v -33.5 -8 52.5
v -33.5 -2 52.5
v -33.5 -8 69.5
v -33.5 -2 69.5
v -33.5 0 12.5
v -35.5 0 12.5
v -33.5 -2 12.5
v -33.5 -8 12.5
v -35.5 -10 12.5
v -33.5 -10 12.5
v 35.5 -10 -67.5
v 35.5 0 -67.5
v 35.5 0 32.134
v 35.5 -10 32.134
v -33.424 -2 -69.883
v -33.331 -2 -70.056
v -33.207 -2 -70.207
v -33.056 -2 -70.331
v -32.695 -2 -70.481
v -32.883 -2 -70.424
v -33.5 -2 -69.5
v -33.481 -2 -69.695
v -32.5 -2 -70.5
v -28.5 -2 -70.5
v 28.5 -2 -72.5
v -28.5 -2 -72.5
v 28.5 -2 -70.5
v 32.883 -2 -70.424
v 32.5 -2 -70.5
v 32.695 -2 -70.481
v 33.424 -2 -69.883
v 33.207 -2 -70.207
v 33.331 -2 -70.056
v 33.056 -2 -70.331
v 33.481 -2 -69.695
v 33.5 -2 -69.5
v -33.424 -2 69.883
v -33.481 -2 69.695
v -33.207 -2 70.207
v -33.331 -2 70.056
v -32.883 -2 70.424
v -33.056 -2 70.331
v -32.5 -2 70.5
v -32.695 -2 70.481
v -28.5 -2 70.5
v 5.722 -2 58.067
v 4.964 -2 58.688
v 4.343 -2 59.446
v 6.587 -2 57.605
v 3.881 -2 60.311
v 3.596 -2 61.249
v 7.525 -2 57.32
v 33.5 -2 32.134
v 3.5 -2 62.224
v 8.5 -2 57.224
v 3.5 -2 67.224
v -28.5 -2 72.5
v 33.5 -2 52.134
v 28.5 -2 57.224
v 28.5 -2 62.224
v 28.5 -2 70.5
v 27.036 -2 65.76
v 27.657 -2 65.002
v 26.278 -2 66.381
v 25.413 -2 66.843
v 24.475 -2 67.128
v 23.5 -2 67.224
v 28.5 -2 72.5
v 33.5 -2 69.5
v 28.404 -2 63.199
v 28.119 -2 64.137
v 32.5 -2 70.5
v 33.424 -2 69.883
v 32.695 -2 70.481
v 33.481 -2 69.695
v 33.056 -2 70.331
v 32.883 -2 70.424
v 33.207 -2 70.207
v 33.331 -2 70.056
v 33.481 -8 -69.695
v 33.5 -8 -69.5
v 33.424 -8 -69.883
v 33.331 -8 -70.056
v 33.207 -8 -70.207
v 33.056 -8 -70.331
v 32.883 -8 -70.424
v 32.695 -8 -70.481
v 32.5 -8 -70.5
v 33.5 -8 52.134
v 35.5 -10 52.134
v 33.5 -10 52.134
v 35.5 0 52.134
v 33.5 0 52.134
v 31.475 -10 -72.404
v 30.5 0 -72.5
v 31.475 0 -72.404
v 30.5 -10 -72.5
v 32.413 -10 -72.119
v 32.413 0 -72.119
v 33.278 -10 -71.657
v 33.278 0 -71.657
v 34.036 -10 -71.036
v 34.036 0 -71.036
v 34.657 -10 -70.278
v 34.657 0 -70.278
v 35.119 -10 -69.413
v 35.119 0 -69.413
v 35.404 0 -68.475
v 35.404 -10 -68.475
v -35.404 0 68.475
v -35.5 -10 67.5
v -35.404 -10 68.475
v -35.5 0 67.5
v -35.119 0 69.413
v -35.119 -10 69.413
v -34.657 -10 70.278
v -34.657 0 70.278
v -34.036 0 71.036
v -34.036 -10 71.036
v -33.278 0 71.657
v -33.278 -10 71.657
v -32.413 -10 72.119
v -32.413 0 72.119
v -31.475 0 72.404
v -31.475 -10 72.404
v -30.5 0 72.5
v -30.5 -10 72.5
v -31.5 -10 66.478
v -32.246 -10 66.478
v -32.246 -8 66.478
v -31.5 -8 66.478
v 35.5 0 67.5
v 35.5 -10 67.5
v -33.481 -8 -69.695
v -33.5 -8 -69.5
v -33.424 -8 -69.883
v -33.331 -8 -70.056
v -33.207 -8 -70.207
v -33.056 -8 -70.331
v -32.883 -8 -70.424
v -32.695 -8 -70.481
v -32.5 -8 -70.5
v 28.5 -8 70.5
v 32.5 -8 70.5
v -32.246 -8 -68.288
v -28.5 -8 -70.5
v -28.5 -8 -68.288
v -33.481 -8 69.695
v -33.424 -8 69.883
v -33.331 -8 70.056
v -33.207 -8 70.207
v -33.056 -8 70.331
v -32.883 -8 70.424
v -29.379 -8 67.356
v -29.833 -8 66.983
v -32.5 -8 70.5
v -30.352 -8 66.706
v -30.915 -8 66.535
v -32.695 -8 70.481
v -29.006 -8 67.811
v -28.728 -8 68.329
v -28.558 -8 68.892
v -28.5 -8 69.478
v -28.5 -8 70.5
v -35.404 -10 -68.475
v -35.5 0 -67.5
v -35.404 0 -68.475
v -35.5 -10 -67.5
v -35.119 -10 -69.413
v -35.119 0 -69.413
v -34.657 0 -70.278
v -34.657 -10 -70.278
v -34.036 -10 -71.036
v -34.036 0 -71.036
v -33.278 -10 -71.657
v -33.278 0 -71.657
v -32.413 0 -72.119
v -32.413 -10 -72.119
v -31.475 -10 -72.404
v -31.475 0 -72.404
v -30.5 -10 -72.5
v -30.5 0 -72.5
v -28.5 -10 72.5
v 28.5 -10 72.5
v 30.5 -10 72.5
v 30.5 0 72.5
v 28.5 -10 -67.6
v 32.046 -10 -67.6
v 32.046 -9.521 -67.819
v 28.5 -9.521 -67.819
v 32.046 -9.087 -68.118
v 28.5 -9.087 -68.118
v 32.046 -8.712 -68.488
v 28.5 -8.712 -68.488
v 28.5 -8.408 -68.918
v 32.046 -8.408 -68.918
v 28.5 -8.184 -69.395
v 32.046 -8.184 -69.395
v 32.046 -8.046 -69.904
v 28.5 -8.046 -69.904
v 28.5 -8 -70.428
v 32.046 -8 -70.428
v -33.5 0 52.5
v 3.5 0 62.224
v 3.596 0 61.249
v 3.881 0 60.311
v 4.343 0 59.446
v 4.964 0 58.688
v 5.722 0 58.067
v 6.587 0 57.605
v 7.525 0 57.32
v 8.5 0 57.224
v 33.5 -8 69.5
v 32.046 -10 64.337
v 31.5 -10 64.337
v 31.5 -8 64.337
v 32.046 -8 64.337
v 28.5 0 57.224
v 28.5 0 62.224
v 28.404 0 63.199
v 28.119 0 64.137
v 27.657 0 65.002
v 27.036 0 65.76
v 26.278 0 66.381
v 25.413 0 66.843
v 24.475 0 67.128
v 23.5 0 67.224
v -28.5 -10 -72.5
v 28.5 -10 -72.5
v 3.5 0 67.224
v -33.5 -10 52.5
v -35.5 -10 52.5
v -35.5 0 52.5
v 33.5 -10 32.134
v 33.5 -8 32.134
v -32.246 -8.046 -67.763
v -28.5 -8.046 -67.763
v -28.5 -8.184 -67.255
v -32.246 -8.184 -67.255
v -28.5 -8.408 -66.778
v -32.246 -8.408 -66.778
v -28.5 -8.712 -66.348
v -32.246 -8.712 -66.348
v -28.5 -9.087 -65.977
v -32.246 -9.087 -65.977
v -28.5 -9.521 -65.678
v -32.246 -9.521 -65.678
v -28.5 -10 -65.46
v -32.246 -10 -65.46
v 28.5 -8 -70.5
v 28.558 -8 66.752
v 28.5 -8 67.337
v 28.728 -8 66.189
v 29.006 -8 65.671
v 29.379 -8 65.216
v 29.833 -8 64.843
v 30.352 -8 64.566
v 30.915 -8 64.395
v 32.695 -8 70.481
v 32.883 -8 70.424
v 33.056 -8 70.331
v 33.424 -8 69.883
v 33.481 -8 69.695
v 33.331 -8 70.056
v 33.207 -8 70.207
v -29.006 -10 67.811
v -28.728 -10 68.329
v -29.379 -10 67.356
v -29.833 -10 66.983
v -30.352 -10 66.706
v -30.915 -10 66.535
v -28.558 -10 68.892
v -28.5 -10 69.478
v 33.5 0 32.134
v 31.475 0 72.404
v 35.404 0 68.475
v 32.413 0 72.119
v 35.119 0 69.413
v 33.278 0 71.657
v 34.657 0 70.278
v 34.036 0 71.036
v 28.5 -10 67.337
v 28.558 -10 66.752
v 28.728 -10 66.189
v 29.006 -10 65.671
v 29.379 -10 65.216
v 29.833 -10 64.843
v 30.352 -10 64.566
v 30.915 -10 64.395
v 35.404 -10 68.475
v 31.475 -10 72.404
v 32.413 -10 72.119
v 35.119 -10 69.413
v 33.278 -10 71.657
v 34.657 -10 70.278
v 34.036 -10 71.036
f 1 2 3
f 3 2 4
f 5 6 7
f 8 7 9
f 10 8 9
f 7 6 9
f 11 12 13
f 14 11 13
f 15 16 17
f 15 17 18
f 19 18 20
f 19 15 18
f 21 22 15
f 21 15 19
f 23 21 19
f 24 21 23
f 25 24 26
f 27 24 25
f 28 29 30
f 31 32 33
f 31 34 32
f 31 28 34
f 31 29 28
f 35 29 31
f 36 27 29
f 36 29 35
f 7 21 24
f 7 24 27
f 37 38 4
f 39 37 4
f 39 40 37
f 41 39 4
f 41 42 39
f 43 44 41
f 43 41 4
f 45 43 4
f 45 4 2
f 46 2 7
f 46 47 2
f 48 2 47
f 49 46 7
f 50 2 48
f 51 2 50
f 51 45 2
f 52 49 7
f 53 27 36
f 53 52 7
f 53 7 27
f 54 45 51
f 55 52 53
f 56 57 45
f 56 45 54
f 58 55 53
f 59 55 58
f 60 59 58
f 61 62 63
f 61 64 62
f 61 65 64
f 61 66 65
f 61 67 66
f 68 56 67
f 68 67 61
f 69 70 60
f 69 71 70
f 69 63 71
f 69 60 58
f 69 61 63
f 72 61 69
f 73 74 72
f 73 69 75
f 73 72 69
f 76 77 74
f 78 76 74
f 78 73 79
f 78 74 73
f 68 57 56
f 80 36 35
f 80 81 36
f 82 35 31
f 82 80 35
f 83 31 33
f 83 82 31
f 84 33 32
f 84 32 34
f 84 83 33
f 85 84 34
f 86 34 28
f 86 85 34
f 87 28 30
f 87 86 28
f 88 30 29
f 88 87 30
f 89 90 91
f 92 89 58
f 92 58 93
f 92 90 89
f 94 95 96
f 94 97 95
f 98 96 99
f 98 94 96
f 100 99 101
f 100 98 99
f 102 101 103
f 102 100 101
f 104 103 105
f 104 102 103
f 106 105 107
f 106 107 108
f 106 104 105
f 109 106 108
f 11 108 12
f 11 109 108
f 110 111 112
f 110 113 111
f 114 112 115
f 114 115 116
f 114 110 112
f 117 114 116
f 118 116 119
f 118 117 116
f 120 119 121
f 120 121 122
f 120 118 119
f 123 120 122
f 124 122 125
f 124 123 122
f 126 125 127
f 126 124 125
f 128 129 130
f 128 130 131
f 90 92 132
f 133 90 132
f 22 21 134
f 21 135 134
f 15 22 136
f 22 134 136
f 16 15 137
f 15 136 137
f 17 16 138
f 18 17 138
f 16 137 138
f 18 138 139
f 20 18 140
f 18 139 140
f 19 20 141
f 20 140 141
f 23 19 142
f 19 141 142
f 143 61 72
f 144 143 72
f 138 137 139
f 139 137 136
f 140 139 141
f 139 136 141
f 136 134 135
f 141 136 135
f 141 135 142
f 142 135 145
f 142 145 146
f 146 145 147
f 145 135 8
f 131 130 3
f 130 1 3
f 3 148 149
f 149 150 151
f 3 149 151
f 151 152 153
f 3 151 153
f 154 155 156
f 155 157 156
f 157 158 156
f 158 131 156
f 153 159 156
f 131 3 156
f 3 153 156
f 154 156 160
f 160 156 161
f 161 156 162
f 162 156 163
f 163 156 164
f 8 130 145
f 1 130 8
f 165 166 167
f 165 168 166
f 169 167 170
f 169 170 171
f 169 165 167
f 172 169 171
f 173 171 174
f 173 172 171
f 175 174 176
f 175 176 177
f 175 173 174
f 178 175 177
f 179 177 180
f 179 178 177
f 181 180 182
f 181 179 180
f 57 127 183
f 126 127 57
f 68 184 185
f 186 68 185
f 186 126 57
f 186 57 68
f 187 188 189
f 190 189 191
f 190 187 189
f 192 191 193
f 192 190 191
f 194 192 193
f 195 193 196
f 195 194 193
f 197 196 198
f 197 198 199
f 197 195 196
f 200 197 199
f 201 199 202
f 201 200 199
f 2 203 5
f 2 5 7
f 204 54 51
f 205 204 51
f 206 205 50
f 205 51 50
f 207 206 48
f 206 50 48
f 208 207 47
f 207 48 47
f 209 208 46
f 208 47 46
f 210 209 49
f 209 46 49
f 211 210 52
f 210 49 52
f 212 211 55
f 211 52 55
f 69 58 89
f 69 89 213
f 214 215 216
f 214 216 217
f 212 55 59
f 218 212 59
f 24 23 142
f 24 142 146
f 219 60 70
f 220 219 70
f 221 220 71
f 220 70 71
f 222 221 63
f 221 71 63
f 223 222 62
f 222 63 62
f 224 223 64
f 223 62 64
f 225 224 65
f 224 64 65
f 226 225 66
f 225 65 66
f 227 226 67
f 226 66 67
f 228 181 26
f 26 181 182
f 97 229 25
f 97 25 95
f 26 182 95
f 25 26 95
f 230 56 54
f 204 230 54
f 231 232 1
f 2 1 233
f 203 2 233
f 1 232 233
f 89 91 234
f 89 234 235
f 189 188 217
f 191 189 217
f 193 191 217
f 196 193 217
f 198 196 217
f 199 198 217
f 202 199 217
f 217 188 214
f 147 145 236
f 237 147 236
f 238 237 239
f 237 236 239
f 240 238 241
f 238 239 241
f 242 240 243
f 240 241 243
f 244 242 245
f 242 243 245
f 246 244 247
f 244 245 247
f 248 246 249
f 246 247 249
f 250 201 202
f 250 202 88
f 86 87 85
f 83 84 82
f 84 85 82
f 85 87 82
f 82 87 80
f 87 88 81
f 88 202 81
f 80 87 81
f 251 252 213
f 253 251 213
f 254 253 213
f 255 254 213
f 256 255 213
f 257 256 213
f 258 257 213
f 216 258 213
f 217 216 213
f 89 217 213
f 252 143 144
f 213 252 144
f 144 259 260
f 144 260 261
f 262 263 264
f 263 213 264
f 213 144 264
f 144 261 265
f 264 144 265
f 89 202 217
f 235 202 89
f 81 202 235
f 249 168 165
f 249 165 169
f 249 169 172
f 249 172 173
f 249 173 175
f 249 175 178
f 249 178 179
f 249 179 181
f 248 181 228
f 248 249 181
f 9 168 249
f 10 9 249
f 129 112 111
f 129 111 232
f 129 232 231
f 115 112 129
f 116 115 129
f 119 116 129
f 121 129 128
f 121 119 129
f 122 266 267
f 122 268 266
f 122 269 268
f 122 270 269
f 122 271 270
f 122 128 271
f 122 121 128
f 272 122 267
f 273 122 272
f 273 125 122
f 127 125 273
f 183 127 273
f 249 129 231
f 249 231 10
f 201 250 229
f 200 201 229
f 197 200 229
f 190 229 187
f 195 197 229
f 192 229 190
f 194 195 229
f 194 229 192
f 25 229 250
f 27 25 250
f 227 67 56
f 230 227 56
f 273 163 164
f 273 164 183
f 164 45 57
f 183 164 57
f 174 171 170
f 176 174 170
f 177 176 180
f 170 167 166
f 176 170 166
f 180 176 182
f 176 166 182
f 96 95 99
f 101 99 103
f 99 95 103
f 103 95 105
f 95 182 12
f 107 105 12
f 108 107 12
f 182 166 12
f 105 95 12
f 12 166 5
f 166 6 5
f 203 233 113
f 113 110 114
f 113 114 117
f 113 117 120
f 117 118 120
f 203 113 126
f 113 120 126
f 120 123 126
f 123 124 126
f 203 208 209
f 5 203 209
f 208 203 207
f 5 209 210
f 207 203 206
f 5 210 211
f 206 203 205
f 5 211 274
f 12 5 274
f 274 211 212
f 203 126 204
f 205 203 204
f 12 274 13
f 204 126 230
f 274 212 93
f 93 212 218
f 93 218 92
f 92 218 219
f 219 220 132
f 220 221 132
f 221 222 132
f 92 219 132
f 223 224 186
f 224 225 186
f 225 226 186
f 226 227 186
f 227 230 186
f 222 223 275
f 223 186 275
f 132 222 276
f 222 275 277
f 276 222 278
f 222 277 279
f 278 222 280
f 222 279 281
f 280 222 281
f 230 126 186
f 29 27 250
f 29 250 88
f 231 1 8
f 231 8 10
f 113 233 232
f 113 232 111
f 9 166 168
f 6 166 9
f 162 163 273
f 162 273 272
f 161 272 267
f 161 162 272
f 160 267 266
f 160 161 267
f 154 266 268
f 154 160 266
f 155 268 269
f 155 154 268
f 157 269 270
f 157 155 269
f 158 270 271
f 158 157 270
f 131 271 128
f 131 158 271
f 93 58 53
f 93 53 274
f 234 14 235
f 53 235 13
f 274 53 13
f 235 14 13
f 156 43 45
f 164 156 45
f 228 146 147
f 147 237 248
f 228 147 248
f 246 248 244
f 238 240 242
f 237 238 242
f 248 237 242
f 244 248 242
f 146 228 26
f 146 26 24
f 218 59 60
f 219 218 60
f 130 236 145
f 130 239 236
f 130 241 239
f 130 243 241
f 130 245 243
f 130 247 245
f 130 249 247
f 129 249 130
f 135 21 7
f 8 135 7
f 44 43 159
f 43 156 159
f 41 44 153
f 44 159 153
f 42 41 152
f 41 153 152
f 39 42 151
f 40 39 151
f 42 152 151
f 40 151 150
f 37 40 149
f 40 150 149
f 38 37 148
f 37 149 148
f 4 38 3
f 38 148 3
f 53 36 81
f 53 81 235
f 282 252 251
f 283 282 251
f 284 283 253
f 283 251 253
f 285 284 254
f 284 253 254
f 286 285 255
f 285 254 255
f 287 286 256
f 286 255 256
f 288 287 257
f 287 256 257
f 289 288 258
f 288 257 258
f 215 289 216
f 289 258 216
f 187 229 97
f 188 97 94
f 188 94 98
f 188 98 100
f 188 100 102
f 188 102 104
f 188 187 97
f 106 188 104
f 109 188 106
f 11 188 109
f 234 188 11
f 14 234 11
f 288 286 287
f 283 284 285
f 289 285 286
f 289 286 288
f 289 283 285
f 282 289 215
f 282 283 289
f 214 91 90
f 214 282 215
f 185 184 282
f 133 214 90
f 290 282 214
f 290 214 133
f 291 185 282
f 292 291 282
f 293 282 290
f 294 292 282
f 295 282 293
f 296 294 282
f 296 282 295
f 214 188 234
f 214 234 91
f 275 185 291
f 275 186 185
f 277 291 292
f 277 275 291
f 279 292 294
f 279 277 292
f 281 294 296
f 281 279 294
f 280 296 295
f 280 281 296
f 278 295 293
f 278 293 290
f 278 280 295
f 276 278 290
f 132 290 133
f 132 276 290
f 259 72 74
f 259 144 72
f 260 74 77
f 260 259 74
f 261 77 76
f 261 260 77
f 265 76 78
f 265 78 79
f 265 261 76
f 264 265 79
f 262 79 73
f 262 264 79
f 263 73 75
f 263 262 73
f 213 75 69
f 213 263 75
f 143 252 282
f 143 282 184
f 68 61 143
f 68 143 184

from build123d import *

# Parameters (mm, degrees)
F0_W         = 71
F0_H         = 145
F1_DEPTH     = 2
F2_W         = 7
F2_H         = 145
F3_DEPTH     = 8
F4_T         = 2
F5_W         = 3.7458891392
F5_H         = 131.9372802973
F6_DEPTH     = 2
F7_W         = 3.5460759103
F7_H         = 131.9372802973
F8_DEPTH     = 2
F9_R         = 5
F11_DEPTH    = 2.5
F13_DEPTH    = 2
F15_T1_DEPTH = 9.5
F15_T3_DEPTH = 10.6171437222
F15_T5_DEPTH = 10.816956951
F16_R        = 1
F14_W        = 10
F14_H        = 20
F17_DEPTH    = 2


# Not quite as in the source:
# - a fillet or chamfer that OpenCascade refuses, or shapes differently, is made with other operations: its cross-section is extruded or revolved along the edge and cut away or added
# - a shell that OpenCascade refuses in one call is made with other operations: the cavity is built on its own and cut out
# - a feature names something its author has since deleted; it is built from what else it names


with BuildPart() as f1:
    # F0 (on Front) → F1 (new body)
    with BuildSketch(Plane.XZ):
        Rectangle(F0_W, F0_H)
    extrude(amount=F1_DEPTH)

    # F2 (on face) → F3 (join)
    with BuildSketch(Plane.XZ.offset(2)):
        with Locations((-32, 0)):
            Rectangle(F2_W, F2_H)
        with Locations((32, 0)):
            Rectangle(F2_W, F2_H)
    extrude(amount=F3_DEPTH)

    # F4: shell of thickness 2, made by hand


with BuildPart() as f4_core1:
    # F4_t2: copy of F1
    add(f1.part)

    # the walls: a layer under each face that stays
    f4_faces = [f4_core1.faces().sort_by_distance(p)[0] for p in [
        (23.6666666667, -1.6666666667, 72.5),
        (0, 0, 0),
        (-23.6666666667, -1.6666666667, -72.5),
        (-35.5, -5, 0),
        (-32, -10, 0),
        (0, -2, 0),
        (32, -10, 0),
        (35.5, -5, 0),
    ]]
    thicken(f4_faces, amount=-F4_T, mode=Mode.SUBTRACT)


with BuildPart() as f1_1:
    add(f1.part)

    # what is left inside the walls is the cavity
    f4_cavity = [f4_core1.part.solids().sort_by_distance(p)[0] for p in [
        (33.48, -6, 0),
        (-28.52, -6, 0),
    ]]
    add(f4_cavity, mode=Mode.SUBTRACT)

    # F5 (on face) → F6 (cut)
    with BuildSketch(Plane.XZ.offset(10)):
        with Locations((-30.3729445696, 0.5088895559)):
            Rectangle(F5_W, F5_H)
    extrude(amount=-F6_DEPTH, mode=Mode.SUBTRACT)

    # F7 (on face) → F8 (cut)
    with BuildSketch(Plane.XZ.offset(10)):
        with Locations((30.2730379552, -1.6313598514)):
            Rectangle(F7_W, F7_H)
    extrude(amount=-F8_DEPTH, mode=Mode.SUBTRACT)

    # F9
    f9_edges = [f1_1.edges().sort_by_distance(p)[0] for p in [
        (-35.5, -5, 72.5),
        (35.5, -5, 72.5),
        (35.5, -5, -72.5),
        (-35.5, -5, -72.5),
    ]]
    fillet(f9_edges, radius=F9_R)

    # F10 (on face) → F11 (cut)
    with BuildSketch(Plane.XZ.offset(2)):
        with BuildLine():
            ThreePointArc((28.5, 62.2240006924), (27.0355339059, 65.7595345983), (23.5, 67.2240006924))
            Line((23.5, 67.2240006924), (3.5, 67.2240006924))
            Line((3.5, 67.2240006924), (3.5, 62.2240006924))
            ThreePointArc((3.5, 62.2240006924), (4.9644660941, 58.6884667864), (8.5, 57.2240006924))
            Line((8.5, 57.2240006924), (28.5, 57.2240006924))
            Line((28.5, 57.2240006924), (28.5, 62.2240006924))
        make_face()
    extrude(amount=-F11_DEPTH, mode=Mode.SUBTRACT)

    # F12 (on face) → F13 (cut)
    with BuildSketch(Plane(origin=(-35.5, 0, 0), x_dir=(0, -1, 0), z_dir=(-1, 0, 0))):
        Polygon((10, 52.5), (0, 52.5), (0, 12.5), (10, 12.5), (10, 47.0733729486), align=None)
    extrude(amount=-F13_DEPTH, mode=Mode.SUBTRACT)

    # F15: fillet of radius 3 on 4 edges, made by hand

    # F15_s2 → F15_t1 (cut)
    with BuildSketch(Plane.XZ.offset(8)):
        with BuildLine():
            ThreePointArc((28.5, 67.3372802973), (29.3786796564, 65.2159599537), (31.5, 64.3372802973))
            Line((31.5, 64.3372802973), (28.5, 64.3372802973))
            Line((28.5, 64.3372802973), (28.5, 67.3372802973))
        make_face()
        with BuildLine():
            ThreePointArc((-28.5, 69.4775297046), (-29.3786796564, 67.356209361), (-31.5, 66.4775297046))
            Line((-31.5, 66.4775297046), (-28.5, 66.4775297046))
            Line((-28.5, 66.4775297046), (-28.5, 69.4775297046))
        make_face()
    extrude(amount=F15_T1_DEPTH, mode=Mode.SUBTRACT)

    # F15_s4 → F15_t3 (cut)
    with BuildSketch(Plane.YZ.offset(21.4289321881)):
        with BuildLine():
            ThreePointArc((-10, -67.6), (-8.5505102572, -68.6963763172), (-8, -70.4284271247))
            Line((-8, -70.4284271247), (-8, -67.6))
            Line((-8, -67.6), (-10, -67.6))
        make_face()
    extrude(amount=F15_T3_DEPTH, mode=Mode.SUBTRACT)

    # F15_s6 → F15_t5 (cut)
    with BuildSketch(Plane.YZ.offset(-32.2458891392)):
        with BuildLine():
            ThreePointArc((-8, -68.2881777175), (-8.5505102572, -66.5561269099), (-10, -65.4597505927))
            Line((-10, -65.4597505927), (-8, -65.4597505927))
            Line((-8, -65.4597505927), (-8, -68.2881777175))
        make_face()
    extrude(amount=F15_T5_DEPTH, mode=Mode.SUBTRACT)

    # F16
    f16_edges = [f1_1.edges().sort_by_distance(p)[0] for p in [
        (33.5, -5, 70.5),
        (-33.5, -5, 70.5),
        (-33.5, -5, -70.5),
        (33.5, -5, -70.5),
    ]]
    fillet(f16_edges, radius=F16_R)

    # F14 (on face) → F17 (cut)
    with BuildSketch(Plane.YZ.offset(35.5)):
        with Locations((-5, 42.1337091768)):
            Rectangle(F14_W, F14_H)
    extrude(amount=-F17_DEPTH, mode=Mode.SUBTRACT)


solid = f1_1.part
